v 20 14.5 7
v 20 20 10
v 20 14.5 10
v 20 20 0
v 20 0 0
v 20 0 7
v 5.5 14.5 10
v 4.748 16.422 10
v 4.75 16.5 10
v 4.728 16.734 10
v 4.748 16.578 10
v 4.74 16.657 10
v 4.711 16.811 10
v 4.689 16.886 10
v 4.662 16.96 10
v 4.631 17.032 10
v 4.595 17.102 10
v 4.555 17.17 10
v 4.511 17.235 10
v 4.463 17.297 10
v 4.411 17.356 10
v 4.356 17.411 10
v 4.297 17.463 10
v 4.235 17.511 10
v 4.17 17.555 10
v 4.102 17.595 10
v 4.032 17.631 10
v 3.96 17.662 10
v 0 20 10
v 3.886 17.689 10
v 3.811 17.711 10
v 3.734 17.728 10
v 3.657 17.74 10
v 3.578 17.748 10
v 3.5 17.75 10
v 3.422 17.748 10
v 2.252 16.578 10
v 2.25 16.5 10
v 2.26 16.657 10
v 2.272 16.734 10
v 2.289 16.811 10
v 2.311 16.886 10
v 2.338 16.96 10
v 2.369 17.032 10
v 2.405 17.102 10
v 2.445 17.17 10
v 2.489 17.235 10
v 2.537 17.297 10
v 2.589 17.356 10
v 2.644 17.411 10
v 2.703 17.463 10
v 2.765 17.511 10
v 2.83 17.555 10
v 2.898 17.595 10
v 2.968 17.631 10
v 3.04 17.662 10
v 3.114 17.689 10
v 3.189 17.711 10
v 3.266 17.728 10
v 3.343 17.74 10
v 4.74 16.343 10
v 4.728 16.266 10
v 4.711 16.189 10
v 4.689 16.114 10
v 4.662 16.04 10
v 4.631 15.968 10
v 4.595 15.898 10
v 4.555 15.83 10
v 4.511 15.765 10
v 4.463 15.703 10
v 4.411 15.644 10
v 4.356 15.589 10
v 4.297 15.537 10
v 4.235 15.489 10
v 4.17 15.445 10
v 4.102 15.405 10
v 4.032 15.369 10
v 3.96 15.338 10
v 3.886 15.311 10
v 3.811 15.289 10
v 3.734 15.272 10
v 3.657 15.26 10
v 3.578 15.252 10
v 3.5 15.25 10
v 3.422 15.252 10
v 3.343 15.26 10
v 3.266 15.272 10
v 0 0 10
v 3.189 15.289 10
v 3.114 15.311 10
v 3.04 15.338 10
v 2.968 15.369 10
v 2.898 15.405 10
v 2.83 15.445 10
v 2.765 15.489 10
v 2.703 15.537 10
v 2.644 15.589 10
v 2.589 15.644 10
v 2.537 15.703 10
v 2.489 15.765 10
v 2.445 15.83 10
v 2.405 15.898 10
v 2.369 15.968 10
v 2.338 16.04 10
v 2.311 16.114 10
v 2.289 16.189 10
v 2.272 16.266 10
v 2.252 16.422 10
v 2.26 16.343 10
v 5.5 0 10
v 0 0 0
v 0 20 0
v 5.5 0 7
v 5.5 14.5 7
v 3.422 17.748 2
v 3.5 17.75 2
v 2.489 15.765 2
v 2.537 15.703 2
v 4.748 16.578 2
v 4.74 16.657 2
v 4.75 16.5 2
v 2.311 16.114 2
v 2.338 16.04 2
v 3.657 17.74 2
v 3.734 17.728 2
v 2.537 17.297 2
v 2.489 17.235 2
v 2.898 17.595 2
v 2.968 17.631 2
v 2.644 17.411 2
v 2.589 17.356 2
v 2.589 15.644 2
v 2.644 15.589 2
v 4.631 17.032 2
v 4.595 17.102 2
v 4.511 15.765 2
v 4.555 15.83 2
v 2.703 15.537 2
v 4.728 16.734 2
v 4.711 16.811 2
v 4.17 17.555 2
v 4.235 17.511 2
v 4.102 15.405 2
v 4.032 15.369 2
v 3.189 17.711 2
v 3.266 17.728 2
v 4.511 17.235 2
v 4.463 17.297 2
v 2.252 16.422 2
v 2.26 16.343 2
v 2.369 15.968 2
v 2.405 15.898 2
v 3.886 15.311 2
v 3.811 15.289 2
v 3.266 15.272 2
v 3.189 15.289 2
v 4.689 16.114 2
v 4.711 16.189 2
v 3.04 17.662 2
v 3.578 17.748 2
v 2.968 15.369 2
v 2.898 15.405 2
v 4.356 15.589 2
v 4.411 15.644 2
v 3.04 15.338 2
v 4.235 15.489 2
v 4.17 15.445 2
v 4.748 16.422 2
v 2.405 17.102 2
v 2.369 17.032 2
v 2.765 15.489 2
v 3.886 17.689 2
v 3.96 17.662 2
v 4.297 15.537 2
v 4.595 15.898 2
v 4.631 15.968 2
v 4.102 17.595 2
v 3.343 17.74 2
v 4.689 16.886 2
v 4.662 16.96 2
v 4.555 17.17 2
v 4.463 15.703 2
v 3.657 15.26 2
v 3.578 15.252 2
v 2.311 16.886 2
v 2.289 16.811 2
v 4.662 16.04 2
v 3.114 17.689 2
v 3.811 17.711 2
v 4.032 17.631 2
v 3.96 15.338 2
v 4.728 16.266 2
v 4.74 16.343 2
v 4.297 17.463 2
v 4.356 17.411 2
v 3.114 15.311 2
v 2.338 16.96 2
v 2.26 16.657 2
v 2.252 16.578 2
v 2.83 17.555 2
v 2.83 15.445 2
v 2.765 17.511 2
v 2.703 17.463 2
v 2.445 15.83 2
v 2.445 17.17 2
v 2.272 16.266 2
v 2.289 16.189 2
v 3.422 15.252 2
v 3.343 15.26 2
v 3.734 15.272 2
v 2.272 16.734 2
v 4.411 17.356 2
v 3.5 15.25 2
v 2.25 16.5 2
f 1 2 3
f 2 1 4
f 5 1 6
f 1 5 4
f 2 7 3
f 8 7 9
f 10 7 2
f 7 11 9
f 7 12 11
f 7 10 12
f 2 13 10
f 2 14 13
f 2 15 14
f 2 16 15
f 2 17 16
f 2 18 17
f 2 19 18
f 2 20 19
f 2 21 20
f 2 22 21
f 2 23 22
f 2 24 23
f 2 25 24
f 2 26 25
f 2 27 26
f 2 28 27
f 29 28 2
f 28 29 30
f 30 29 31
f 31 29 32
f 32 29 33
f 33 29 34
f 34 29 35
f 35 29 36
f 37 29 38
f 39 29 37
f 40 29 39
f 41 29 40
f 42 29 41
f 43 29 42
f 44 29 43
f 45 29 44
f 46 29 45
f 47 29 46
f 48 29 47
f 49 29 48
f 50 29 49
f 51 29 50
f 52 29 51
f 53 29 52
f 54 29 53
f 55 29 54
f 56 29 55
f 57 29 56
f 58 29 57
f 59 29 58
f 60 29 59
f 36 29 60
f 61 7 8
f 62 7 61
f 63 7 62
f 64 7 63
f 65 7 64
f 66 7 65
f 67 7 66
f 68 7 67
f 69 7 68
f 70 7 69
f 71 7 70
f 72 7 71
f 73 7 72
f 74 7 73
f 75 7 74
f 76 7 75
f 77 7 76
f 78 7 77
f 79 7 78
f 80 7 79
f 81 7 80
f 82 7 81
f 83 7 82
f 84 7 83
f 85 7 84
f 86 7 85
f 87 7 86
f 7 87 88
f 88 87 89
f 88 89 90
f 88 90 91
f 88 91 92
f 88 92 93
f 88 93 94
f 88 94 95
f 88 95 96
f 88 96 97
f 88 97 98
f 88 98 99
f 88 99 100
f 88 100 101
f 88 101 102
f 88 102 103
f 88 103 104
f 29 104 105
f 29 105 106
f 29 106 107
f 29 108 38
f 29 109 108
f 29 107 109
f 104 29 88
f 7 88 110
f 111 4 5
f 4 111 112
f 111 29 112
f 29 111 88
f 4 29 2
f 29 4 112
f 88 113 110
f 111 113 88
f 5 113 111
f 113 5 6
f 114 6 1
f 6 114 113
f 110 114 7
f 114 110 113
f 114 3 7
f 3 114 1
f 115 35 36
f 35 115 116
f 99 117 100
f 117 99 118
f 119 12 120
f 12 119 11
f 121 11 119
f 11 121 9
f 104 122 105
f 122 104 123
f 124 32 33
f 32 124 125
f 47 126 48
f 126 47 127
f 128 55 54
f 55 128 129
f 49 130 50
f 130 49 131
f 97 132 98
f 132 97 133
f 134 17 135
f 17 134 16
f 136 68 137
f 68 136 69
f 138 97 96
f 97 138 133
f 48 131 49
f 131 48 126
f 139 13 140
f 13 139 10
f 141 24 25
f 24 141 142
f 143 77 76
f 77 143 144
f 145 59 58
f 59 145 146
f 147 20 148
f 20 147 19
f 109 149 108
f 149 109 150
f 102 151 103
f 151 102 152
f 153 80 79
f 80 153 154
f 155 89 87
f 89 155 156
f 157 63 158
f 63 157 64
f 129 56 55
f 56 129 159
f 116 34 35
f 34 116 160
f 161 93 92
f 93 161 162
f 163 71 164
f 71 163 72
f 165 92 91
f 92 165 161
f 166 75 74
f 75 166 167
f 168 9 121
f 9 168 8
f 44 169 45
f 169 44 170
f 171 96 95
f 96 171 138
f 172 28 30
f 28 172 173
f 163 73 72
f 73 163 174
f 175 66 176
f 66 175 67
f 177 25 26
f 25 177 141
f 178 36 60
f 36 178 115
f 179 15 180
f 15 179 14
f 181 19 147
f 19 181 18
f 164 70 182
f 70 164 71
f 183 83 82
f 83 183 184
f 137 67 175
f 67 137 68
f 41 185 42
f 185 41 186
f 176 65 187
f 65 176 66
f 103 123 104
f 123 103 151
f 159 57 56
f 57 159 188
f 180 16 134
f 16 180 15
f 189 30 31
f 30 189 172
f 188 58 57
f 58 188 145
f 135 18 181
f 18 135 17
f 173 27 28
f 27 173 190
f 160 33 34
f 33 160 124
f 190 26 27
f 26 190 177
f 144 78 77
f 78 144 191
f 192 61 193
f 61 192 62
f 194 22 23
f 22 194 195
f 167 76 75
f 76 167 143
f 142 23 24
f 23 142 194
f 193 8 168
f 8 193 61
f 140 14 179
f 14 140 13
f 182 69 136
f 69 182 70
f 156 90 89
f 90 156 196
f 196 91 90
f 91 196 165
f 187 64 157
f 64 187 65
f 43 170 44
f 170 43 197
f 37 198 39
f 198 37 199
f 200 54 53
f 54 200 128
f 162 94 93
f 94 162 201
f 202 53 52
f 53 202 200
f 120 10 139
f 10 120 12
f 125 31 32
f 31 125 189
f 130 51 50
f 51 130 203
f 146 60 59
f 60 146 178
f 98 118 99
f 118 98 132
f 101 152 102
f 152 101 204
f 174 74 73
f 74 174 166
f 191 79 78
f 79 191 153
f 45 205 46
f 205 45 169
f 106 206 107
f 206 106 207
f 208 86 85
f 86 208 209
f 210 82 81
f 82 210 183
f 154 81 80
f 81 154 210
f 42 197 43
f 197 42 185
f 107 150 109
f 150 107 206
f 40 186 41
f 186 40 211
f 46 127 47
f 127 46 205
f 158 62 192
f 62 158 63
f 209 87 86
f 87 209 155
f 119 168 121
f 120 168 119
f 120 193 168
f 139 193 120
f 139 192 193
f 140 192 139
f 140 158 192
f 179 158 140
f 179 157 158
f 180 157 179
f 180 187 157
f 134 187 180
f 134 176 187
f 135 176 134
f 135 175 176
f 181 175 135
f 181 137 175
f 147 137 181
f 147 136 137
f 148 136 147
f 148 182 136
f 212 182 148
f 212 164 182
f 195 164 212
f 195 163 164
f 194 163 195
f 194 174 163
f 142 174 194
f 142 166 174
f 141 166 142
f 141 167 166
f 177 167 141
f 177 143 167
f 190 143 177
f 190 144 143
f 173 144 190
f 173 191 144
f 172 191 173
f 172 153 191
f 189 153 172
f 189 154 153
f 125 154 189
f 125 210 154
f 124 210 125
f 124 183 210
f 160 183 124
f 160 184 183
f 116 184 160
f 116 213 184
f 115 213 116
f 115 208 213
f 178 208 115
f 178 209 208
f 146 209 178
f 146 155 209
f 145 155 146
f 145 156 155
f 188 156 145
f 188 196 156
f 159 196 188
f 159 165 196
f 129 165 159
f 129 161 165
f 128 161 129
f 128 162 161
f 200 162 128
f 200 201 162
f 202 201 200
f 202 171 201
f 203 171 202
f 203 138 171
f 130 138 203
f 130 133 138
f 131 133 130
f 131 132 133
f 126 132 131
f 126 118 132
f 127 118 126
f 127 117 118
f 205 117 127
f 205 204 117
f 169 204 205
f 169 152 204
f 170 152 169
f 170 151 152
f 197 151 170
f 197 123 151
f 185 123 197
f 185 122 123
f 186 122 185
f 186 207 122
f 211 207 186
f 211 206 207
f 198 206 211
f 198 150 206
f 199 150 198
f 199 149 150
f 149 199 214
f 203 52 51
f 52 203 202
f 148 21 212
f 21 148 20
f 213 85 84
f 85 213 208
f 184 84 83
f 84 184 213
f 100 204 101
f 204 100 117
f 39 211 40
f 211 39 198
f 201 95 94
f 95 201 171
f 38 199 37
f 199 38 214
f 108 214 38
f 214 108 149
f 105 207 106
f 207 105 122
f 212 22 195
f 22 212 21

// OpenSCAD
widthX = 20;

widthY = 20;

height = 10;

wallWidth = 3;

outerWidth = 5;

difference() {
    cube([widthX, widthY, height]);

    translate([outerWidth + 0.5, -1, height - wallWidth ]) {
        cube([widthX + 1, widthY - outerWidth + 0.5, wallWidth + 2]);
    }

    // Join holes
    translate([3.5 , widthY - 3.5, 2]) {
        cylinder(r=1.25, h=11, $fn=100);
    }
}
